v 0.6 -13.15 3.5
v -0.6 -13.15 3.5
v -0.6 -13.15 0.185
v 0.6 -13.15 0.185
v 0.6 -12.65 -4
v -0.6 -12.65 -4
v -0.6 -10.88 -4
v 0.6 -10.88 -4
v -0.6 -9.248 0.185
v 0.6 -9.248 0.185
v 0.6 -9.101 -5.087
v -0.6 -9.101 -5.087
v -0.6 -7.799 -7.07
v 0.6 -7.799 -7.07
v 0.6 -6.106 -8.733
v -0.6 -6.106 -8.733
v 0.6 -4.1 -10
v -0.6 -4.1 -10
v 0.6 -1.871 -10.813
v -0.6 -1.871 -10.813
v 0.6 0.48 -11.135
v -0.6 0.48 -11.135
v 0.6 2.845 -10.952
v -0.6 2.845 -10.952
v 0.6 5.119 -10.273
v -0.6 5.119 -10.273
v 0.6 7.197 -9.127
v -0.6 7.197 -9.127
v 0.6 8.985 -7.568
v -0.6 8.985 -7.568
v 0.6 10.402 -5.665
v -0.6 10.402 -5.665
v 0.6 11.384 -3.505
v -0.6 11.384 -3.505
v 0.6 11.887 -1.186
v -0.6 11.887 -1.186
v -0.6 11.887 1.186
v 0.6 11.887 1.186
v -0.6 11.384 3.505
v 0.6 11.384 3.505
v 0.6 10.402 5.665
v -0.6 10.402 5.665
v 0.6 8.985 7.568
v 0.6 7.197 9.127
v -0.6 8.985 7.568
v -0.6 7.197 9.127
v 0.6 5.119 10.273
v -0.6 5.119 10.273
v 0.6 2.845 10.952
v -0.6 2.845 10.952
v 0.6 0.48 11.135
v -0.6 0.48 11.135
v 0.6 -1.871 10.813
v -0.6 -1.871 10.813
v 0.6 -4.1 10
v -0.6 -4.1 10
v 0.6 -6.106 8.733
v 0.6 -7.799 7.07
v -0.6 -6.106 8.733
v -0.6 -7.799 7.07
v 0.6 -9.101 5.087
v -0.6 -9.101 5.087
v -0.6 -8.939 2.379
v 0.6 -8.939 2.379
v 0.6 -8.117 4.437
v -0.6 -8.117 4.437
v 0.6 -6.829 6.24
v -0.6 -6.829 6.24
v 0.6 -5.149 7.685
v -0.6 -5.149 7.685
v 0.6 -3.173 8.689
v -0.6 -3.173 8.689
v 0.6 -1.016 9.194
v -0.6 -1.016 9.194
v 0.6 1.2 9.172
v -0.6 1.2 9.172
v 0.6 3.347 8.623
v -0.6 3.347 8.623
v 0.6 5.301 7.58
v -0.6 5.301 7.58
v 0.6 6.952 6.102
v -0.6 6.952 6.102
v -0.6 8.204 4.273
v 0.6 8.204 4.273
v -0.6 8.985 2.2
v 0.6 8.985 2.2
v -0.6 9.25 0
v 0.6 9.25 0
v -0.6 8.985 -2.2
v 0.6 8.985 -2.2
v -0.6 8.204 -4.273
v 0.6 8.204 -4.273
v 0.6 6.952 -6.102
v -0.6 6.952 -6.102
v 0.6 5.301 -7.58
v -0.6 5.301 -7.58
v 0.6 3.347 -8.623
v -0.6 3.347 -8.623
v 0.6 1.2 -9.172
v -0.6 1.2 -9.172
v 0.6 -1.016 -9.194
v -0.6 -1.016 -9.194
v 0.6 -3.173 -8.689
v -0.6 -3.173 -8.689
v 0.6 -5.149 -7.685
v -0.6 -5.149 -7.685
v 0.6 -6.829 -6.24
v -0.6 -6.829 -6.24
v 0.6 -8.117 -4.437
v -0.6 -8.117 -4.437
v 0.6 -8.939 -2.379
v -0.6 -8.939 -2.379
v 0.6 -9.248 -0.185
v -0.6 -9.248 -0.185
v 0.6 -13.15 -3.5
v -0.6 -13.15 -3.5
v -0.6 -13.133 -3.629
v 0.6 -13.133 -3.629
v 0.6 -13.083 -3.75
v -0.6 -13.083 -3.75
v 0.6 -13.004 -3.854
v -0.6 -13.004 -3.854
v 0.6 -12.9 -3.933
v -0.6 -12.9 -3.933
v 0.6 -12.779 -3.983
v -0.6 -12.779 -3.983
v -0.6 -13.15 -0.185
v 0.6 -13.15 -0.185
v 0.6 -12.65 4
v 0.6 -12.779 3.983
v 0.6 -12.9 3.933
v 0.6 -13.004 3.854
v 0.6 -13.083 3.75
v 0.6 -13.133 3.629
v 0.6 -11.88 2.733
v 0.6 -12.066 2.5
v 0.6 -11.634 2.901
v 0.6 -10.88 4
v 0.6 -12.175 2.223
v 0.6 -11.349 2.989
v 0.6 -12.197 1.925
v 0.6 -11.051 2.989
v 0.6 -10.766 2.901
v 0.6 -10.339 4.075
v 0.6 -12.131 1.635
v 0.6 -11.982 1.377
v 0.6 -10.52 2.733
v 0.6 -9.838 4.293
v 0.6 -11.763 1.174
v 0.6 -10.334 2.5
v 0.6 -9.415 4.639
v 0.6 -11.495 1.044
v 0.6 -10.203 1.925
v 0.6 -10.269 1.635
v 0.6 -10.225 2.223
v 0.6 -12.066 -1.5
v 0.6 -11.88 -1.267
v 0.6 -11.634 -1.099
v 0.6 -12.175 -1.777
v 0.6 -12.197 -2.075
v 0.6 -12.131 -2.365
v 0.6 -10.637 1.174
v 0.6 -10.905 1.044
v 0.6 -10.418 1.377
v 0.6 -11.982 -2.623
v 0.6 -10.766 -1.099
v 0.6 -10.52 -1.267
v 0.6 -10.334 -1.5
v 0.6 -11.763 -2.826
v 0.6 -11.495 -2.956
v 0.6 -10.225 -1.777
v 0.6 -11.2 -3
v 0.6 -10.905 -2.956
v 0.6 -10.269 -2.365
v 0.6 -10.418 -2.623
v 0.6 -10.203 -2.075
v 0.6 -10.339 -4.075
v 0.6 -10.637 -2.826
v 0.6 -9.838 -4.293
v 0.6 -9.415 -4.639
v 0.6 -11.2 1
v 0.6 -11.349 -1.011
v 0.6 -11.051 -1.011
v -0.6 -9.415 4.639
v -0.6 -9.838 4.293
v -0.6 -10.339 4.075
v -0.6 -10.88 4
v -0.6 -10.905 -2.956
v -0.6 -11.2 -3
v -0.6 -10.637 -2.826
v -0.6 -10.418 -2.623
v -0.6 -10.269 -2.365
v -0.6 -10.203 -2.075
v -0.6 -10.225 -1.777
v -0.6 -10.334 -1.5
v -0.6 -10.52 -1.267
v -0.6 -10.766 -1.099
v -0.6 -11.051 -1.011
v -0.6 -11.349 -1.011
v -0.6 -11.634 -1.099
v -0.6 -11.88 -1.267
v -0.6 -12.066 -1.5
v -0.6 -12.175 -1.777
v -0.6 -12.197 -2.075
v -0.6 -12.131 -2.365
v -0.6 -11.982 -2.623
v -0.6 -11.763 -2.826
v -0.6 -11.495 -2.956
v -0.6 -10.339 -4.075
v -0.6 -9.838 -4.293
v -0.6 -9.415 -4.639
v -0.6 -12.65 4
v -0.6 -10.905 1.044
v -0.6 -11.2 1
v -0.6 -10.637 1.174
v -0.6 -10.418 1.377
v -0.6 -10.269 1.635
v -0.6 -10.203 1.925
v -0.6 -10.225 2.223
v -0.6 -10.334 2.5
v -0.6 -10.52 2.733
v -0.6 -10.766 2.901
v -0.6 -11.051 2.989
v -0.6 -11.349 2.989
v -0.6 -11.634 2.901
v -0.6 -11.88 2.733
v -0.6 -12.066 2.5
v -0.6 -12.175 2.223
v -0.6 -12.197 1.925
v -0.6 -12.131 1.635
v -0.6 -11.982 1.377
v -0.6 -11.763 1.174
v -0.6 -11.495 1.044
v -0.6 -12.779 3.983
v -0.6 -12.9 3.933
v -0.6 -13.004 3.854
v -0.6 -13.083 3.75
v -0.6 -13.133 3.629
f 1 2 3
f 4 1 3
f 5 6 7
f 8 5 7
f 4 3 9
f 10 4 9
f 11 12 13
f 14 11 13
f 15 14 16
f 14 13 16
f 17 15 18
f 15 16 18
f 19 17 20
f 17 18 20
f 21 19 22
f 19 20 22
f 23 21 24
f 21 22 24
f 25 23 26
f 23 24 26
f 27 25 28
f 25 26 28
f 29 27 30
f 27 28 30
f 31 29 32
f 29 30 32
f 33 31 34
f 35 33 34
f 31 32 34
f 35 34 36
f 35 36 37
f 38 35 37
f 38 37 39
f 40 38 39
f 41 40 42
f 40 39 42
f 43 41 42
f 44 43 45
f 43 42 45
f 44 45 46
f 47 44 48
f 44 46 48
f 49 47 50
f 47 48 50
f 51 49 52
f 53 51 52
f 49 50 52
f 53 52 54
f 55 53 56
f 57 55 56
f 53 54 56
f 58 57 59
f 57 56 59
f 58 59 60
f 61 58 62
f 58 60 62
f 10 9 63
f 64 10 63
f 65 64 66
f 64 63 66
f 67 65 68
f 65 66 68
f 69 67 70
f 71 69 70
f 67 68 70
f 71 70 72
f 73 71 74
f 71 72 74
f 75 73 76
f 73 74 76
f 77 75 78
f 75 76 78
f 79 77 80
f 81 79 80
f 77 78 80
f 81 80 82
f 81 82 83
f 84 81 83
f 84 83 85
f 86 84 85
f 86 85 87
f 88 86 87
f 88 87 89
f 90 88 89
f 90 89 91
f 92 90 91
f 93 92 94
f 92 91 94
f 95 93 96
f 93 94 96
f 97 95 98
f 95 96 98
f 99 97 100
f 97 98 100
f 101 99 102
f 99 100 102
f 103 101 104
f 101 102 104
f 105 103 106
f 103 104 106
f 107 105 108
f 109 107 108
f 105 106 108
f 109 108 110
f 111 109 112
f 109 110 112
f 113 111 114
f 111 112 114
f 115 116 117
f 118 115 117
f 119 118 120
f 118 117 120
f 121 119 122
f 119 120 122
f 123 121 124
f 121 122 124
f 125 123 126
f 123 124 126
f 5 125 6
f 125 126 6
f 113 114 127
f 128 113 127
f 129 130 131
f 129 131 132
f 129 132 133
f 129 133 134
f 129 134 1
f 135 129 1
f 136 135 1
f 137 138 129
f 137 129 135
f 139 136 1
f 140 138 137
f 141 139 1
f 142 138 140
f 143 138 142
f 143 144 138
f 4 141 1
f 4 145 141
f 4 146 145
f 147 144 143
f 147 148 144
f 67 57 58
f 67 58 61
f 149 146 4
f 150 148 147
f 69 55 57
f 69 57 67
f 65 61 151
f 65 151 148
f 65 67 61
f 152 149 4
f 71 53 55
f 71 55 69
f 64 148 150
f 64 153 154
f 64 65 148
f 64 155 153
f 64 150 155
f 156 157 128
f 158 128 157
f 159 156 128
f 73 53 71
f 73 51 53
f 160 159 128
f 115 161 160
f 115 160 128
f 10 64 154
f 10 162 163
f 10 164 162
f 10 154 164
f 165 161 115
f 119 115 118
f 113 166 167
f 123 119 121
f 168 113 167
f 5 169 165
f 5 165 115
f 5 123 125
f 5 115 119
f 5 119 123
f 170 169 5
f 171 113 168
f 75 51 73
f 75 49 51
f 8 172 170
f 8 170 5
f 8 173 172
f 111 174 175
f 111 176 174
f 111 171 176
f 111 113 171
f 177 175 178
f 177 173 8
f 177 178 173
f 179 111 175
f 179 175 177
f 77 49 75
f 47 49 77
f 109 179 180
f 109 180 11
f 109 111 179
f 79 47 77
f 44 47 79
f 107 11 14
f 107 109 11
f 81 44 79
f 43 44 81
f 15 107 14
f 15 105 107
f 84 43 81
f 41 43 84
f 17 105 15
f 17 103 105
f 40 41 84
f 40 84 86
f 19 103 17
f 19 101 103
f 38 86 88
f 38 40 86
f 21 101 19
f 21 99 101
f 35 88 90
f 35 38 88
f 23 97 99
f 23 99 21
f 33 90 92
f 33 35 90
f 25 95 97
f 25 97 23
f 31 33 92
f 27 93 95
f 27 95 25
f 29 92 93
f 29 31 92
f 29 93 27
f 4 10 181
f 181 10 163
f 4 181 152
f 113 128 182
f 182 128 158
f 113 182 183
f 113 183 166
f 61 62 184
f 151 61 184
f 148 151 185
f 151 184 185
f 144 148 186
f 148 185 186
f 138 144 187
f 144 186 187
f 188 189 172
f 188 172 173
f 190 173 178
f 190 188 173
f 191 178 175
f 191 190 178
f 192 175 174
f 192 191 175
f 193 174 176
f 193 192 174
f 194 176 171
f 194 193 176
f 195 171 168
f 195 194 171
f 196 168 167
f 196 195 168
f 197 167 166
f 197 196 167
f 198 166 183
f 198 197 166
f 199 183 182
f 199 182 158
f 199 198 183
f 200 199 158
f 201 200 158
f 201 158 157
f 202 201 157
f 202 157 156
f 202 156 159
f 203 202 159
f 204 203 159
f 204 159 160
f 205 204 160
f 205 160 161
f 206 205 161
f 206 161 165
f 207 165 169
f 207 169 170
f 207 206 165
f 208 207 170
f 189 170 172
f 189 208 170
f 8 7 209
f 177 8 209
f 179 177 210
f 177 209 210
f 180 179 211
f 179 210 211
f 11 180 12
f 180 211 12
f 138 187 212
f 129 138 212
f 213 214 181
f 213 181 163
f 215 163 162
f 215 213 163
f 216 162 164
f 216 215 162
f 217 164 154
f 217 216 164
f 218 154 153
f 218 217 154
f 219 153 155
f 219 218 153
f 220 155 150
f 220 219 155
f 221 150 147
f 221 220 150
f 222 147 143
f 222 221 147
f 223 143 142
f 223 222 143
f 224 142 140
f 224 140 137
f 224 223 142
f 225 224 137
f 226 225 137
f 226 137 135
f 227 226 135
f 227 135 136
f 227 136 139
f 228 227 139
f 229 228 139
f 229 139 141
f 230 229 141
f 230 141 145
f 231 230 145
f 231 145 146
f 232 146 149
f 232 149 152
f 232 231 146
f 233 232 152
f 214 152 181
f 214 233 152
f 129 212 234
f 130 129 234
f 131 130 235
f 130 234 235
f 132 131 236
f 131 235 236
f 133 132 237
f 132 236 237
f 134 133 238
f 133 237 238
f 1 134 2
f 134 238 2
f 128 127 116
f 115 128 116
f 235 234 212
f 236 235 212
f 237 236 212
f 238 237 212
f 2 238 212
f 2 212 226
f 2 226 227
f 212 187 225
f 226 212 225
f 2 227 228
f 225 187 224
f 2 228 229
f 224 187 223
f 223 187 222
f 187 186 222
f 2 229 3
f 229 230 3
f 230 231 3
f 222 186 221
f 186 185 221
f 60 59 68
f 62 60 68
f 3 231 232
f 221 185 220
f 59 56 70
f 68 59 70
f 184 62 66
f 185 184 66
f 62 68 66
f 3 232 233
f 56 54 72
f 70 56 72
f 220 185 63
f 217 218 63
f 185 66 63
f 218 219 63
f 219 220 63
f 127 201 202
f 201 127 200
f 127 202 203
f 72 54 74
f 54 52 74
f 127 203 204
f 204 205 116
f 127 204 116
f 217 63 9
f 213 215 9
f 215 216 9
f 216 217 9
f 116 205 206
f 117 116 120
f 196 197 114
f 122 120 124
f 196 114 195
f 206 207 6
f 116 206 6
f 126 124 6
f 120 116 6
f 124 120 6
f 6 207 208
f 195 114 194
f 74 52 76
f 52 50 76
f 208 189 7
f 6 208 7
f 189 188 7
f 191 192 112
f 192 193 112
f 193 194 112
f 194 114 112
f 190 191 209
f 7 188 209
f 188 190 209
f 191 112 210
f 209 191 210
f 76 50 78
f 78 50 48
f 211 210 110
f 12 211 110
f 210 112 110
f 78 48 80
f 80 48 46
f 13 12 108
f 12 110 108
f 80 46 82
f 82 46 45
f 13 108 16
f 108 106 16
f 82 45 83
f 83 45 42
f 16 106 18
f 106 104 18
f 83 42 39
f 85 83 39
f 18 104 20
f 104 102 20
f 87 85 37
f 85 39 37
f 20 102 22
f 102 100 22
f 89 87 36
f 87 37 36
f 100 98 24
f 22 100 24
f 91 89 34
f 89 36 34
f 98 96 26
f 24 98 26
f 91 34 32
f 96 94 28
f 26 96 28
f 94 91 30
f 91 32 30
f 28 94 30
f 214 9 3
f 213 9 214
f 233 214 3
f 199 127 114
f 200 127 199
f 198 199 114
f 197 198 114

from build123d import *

# Parameters (mm, degrees)
EXTRUDE_1_DEPTH      = 0.6
EXTRUDE_1_DEPTH_BACK = 0.6
SKETCH_1_R           = 1


with BuildPart() as part:
    # 草圖1 → 填料-伸長1 (new, two sides: drawn at the far end of the back side and taken through both)
    with BuildSketch(Plane(origin=(0, 0, 0), x_dir=(0, 0, -1), z_dir=(1, 0, 0)).offset(-EXTRUDE_1_DEPTH_BACK)):
        with BuildLine():
            Line((-4, -10.8801497), (-4, -12.65))
            ThreePointArc((-4, -12.65), (-3.853553391, -13.003553391), (-3.5, -13.15))
            Line((-3.5, -13.15), (-0.185, -13.15))
            Line((-0.185, -13.15), (-0.185, -9.248149815))
            ThreePointArc((-0.185, -9.248149815), (0, 9.25), (0.185, -9.248149815))
            Line((0.185, -9.248149815), (0.185, -13.15))
            Line((0.185, -13.15), (3.5, -13.15))
            ThreePointArc((3.5, -13.15), (3.853553391, -13.003553391), (4, -12.65))
            Line((4, -12.65), (4, -10.8801497))
            ThreePointArc((4, -10.8801497), (4.293177827, -9.837672808), (5.08675807, -9.100827026))
            ThreePointArc((5.08675807, -9.100827026), (5.9e-08, 11.95), (-5.086758175, -9.100826972))
            ThreePointArc((-5.086758175, -9.100826972), (-4.293177858, -9.837672758), (-4, -10.8801497))
        make_face()
        with Locations((2, -11.2)):
            Circle(SKETCH_1_R, mode=Mode.SUBTRACT)
        with Locations((-2, -11.2)):
            Circle(SKETCH_1_R, mode=Mode.SUBTRACT)
    extrude(amount=EXTRUDE_1_DEPTH + EXTRUDE_1_DEPTH_BACK)


solid = part.part
